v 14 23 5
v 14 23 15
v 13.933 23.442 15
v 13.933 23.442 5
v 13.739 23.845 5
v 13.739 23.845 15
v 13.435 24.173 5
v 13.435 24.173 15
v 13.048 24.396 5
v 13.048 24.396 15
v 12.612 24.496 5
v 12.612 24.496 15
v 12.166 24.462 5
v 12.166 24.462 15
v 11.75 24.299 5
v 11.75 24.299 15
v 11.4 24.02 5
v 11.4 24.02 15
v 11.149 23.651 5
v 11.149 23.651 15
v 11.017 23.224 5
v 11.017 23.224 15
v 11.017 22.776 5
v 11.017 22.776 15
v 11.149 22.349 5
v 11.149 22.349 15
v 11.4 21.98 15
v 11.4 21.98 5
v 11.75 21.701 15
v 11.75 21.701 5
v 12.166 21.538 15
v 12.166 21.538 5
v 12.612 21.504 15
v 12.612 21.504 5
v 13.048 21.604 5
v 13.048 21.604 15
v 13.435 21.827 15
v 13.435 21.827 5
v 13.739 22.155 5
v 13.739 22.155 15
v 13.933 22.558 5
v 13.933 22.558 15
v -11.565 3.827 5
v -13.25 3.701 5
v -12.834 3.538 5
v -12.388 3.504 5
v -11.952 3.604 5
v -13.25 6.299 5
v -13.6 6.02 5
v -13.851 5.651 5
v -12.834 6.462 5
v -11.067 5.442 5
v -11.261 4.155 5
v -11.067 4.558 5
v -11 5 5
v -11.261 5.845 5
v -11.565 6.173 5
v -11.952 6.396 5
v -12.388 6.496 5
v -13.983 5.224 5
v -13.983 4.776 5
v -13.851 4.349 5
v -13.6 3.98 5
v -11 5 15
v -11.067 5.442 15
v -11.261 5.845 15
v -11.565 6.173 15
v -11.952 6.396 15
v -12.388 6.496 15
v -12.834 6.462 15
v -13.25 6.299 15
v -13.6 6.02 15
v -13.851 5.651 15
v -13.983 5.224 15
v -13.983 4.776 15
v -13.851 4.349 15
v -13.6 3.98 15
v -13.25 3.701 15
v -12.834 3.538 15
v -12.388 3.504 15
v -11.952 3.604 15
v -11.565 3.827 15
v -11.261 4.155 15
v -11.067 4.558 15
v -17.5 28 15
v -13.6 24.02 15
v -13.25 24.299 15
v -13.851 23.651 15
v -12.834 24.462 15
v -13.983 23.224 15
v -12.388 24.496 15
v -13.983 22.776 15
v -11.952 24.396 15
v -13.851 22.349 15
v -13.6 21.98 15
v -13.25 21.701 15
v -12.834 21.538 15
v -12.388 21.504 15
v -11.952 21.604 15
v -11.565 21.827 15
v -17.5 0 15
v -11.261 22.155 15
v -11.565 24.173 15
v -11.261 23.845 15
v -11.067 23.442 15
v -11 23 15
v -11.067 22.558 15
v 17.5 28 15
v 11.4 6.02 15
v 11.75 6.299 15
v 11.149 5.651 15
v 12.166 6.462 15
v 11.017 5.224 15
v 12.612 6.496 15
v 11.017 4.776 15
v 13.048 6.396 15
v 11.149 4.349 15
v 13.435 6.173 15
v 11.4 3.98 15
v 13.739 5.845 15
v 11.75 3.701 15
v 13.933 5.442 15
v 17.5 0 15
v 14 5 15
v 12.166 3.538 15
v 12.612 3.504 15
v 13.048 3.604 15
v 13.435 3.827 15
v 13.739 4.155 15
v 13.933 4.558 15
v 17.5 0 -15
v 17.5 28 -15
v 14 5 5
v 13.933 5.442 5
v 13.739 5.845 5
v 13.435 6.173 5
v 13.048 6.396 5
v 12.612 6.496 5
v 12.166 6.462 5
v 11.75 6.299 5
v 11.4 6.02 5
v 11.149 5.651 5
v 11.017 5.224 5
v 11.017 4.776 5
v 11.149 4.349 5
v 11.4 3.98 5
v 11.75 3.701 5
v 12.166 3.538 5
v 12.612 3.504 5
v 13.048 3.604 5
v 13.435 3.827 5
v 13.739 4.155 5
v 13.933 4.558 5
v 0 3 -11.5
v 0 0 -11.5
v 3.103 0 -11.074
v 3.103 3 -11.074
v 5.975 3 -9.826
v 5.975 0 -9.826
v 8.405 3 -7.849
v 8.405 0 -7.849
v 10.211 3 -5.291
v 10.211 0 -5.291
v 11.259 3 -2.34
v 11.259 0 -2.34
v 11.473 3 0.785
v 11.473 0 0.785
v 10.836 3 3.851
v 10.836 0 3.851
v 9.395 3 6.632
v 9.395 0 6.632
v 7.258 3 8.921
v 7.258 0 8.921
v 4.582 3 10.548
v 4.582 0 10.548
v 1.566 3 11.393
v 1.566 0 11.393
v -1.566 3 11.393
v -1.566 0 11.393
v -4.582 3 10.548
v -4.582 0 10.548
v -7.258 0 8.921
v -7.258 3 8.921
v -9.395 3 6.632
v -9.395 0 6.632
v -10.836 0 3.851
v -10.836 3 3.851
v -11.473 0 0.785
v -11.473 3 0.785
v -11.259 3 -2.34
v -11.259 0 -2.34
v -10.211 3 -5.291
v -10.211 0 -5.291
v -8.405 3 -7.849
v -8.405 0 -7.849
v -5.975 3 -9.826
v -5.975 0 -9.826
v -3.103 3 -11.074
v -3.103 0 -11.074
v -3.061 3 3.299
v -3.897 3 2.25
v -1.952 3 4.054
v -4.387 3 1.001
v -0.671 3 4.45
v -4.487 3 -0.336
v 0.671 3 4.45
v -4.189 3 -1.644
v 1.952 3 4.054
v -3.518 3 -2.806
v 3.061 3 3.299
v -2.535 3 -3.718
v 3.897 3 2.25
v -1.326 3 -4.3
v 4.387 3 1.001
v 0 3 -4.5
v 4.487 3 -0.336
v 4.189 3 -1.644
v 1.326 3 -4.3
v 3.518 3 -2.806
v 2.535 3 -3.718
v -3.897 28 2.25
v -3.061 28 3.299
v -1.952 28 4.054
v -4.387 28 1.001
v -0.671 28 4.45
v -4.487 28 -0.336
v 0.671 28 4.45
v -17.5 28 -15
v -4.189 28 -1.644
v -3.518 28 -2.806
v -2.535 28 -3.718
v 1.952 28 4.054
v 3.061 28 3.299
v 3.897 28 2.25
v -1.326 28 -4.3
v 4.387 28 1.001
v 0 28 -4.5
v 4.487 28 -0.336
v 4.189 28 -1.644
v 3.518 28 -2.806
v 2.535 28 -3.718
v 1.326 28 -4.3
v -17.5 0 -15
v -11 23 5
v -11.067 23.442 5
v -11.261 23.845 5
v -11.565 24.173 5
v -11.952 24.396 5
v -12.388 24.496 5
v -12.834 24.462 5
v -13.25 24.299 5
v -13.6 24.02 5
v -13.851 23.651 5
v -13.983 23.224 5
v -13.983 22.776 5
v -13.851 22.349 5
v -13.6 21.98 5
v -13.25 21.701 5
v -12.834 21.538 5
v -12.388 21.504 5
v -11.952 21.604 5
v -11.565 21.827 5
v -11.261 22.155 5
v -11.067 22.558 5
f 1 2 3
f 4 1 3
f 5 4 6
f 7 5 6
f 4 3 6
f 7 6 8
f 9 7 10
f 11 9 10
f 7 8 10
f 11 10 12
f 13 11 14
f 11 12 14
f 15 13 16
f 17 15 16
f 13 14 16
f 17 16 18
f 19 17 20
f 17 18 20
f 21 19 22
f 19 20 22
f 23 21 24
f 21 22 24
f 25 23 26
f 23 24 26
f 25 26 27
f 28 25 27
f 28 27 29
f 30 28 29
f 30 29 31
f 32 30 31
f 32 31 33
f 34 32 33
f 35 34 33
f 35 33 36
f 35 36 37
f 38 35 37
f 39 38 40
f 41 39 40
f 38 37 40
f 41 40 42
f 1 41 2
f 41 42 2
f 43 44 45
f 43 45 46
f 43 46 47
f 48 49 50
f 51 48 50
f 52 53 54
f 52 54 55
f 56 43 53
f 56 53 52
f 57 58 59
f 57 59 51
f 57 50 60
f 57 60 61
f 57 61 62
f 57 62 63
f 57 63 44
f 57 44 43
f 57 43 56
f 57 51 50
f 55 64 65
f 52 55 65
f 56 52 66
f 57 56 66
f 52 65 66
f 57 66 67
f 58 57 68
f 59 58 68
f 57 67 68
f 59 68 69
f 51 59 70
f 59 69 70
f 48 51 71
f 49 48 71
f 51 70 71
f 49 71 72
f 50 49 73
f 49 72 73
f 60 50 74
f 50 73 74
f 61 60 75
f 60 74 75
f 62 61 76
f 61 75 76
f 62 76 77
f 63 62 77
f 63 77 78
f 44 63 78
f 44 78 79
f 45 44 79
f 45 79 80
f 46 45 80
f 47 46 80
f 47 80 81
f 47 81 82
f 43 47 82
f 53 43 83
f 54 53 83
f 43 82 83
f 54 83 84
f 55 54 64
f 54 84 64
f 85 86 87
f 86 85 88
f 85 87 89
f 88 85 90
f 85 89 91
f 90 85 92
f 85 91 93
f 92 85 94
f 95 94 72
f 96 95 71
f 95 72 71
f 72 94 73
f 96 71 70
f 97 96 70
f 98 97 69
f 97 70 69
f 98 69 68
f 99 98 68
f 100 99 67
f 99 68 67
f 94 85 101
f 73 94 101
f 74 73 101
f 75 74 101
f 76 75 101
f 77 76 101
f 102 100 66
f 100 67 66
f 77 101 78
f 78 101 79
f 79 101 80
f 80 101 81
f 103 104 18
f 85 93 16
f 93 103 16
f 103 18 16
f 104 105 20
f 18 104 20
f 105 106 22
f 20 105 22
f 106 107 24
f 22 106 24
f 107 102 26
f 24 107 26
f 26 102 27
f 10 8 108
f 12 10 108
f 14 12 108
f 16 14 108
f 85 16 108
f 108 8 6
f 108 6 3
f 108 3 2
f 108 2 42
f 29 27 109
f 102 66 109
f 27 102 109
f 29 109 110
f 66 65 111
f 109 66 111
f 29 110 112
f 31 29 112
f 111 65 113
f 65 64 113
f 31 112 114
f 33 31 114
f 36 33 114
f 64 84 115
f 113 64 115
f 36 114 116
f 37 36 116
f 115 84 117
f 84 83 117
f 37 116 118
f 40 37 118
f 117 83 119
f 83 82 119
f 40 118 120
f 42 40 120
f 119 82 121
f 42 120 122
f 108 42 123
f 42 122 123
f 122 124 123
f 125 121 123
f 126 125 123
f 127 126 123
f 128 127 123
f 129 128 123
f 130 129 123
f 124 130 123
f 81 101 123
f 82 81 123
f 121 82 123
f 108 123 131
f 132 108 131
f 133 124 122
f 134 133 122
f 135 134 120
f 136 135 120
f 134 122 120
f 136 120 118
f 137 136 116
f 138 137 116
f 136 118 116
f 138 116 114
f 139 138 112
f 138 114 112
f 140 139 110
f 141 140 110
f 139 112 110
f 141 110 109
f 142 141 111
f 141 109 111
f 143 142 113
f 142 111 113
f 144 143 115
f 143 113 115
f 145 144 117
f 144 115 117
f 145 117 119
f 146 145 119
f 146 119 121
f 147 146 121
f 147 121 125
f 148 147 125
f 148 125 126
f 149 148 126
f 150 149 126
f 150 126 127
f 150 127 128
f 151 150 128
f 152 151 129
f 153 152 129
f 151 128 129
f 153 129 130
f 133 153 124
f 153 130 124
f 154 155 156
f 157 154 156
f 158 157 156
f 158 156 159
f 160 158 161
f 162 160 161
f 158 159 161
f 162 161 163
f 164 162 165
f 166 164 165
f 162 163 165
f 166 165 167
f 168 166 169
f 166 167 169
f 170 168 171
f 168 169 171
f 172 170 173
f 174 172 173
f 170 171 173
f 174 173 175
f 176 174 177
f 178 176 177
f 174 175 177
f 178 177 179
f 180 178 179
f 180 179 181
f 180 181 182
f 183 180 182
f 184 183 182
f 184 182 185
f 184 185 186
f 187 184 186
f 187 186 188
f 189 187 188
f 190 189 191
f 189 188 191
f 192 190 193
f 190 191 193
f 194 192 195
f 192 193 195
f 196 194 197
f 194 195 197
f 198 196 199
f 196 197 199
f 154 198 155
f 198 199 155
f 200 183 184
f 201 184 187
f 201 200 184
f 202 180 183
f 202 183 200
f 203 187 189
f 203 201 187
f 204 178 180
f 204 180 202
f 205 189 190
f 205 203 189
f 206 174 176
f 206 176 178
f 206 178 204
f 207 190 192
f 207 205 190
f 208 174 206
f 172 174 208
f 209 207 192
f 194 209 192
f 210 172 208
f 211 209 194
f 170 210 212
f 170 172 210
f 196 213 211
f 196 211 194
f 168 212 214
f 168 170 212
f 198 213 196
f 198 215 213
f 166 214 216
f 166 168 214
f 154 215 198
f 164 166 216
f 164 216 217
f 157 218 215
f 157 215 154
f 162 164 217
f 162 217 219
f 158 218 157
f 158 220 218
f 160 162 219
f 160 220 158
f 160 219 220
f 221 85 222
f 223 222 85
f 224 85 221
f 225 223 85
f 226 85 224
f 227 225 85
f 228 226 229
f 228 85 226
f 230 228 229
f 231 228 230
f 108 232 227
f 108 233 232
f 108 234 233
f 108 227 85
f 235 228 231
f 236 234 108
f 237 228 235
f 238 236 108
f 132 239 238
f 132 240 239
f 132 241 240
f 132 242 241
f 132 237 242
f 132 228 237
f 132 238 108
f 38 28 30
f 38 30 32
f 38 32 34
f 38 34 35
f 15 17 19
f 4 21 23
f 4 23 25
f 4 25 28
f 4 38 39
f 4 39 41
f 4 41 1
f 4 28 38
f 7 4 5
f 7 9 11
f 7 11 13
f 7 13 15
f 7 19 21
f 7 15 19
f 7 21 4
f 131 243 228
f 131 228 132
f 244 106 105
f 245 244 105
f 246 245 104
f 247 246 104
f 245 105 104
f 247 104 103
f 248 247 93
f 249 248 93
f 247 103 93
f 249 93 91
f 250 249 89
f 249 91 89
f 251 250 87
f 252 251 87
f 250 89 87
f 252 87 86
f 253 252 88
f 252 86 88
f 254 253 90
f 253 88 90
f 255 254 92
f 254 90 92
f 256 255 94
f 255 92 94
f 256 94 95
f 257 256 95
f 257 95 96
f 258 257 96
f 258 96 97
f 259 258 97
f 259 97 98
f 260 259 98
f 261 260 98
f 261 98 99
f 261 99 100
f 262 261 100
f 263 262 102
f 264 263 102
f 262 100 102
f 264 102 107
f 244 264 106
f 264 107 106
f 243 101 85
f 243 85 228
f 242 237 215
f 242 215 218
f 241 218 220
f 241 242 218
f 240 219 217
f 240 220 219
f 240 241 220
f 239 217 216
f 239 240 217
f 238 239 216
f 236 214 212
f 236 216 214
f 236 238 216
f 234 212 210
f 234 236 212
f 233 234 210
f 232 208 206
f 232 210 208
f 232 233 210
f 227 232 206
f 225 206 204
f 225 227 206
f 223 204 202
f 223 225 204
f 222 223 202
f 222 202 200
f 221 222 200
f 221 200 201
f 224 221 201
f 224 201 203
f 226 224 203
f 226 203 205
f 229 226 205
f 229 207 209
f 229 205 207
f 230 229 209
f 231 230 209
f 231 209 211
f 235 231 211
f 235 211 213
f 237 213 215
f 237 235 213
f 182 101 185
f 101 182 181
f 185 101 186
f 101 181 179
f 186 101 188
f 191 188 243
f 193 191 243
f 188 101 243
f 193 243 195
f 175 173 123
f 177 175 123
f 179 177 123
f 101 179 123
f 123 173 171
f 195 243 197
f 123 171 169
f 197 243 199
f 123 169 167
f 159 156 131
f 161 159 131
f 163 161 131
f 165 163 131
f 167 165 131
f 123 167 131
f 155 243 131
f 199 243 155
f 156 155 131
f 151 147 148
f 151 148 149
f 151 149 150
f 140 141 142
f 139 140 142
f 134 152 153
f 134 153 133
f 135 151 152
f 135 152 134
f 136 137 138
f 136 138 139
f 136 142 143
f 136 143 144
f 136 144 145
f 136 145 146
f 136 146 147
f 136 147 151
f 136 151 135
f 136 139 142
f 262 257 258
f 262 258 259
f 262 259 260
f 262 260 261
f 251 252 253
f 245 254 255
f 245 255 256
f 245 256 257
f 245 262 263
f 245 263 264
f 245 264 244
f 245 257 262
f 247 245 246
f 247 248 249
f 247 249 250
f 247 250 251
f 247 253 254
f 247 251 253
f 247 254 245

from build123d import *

# Parameters (mm, degrees)
SKETCH1_W               = 35
SKETCH1_H               = 30
BOSS_EXTRUDE1_DEPTH     = 28
SKETCH2_R               = 1.5
CUT_EXTRUDE1_DEPTH      = 10
SKETCH5_R               = 11.5
CUT_EXTRUDE4_DEPTH      = 3
CUT_EXTRUDE5_DEPTH      = 35.003676272
CUT_EXTRUDE5_DEPTH_BACK = 35.003676272
SKETCH6_R               = 4.5


with BuildPart() as part:
    # Sketch1 → Boss-Extrude1 (new body)
    with BuildSketch(Plane(origin=(0, 0, 0), x_dir=(1, 0, 0), z_dir=(0, 1, 0))):
        Rectangle(SKETCH1_W, SKETCH1_H)
    extrude(amount=BOSS_EXTRUDE1_DEPTH)

    # Sketch2 → Cut-Extrude1 (cut)
    with BuildSketch(Plane.XY.offset(15)):
        with Locations((-12.5, 23)):
            Circle(SKETCH2_R)
        with Locations((12.5, 23)):
            Circle(SKETCH2_R)
        with Locations((12.5, 5)):
            Circle(SKETCH2_R)
        with Locations((-12.5, 5)):
            Circle(SKETCH2_R)
    extrude(amount=-CUT_EXTRUDE1_DEPTH, mode=Mode.SUBTRACT)

    # Sketch5 → Cut-Extrude4 (cut)
    with BuildSketch(Plane.XZ):
        with Locations(Location((0, 0, 0), (0, 0, 270))):
            Circle(SKETCH5_R)
    extrude(amount=-CUT_EXTRUDE4_DEPTH, mode=Mode.SUBTRACT)

    # Sketch6 → Cut-Extrude5 (cut, two sides: drawn at the far end of the back side and taken through both)
    with BuildSketch(Plane(origin=(0, 3, 0), x_dir=(-1, 0, 0), z_dir=(0, -1, 0)).offset(-CUT_EXTRUDE5_DEPTH_BACK)):
        with Locations(Location((0, 0, 0), (0, 0, 90))):
            Circle(SKETCH6_R)
    extrude(amount=CUT_EXTRUDE5_DEPTH + CUT_EXTRUDE5_DEPTH_BACK, mode=Mode.SUBTRACT)


solid = part.part
